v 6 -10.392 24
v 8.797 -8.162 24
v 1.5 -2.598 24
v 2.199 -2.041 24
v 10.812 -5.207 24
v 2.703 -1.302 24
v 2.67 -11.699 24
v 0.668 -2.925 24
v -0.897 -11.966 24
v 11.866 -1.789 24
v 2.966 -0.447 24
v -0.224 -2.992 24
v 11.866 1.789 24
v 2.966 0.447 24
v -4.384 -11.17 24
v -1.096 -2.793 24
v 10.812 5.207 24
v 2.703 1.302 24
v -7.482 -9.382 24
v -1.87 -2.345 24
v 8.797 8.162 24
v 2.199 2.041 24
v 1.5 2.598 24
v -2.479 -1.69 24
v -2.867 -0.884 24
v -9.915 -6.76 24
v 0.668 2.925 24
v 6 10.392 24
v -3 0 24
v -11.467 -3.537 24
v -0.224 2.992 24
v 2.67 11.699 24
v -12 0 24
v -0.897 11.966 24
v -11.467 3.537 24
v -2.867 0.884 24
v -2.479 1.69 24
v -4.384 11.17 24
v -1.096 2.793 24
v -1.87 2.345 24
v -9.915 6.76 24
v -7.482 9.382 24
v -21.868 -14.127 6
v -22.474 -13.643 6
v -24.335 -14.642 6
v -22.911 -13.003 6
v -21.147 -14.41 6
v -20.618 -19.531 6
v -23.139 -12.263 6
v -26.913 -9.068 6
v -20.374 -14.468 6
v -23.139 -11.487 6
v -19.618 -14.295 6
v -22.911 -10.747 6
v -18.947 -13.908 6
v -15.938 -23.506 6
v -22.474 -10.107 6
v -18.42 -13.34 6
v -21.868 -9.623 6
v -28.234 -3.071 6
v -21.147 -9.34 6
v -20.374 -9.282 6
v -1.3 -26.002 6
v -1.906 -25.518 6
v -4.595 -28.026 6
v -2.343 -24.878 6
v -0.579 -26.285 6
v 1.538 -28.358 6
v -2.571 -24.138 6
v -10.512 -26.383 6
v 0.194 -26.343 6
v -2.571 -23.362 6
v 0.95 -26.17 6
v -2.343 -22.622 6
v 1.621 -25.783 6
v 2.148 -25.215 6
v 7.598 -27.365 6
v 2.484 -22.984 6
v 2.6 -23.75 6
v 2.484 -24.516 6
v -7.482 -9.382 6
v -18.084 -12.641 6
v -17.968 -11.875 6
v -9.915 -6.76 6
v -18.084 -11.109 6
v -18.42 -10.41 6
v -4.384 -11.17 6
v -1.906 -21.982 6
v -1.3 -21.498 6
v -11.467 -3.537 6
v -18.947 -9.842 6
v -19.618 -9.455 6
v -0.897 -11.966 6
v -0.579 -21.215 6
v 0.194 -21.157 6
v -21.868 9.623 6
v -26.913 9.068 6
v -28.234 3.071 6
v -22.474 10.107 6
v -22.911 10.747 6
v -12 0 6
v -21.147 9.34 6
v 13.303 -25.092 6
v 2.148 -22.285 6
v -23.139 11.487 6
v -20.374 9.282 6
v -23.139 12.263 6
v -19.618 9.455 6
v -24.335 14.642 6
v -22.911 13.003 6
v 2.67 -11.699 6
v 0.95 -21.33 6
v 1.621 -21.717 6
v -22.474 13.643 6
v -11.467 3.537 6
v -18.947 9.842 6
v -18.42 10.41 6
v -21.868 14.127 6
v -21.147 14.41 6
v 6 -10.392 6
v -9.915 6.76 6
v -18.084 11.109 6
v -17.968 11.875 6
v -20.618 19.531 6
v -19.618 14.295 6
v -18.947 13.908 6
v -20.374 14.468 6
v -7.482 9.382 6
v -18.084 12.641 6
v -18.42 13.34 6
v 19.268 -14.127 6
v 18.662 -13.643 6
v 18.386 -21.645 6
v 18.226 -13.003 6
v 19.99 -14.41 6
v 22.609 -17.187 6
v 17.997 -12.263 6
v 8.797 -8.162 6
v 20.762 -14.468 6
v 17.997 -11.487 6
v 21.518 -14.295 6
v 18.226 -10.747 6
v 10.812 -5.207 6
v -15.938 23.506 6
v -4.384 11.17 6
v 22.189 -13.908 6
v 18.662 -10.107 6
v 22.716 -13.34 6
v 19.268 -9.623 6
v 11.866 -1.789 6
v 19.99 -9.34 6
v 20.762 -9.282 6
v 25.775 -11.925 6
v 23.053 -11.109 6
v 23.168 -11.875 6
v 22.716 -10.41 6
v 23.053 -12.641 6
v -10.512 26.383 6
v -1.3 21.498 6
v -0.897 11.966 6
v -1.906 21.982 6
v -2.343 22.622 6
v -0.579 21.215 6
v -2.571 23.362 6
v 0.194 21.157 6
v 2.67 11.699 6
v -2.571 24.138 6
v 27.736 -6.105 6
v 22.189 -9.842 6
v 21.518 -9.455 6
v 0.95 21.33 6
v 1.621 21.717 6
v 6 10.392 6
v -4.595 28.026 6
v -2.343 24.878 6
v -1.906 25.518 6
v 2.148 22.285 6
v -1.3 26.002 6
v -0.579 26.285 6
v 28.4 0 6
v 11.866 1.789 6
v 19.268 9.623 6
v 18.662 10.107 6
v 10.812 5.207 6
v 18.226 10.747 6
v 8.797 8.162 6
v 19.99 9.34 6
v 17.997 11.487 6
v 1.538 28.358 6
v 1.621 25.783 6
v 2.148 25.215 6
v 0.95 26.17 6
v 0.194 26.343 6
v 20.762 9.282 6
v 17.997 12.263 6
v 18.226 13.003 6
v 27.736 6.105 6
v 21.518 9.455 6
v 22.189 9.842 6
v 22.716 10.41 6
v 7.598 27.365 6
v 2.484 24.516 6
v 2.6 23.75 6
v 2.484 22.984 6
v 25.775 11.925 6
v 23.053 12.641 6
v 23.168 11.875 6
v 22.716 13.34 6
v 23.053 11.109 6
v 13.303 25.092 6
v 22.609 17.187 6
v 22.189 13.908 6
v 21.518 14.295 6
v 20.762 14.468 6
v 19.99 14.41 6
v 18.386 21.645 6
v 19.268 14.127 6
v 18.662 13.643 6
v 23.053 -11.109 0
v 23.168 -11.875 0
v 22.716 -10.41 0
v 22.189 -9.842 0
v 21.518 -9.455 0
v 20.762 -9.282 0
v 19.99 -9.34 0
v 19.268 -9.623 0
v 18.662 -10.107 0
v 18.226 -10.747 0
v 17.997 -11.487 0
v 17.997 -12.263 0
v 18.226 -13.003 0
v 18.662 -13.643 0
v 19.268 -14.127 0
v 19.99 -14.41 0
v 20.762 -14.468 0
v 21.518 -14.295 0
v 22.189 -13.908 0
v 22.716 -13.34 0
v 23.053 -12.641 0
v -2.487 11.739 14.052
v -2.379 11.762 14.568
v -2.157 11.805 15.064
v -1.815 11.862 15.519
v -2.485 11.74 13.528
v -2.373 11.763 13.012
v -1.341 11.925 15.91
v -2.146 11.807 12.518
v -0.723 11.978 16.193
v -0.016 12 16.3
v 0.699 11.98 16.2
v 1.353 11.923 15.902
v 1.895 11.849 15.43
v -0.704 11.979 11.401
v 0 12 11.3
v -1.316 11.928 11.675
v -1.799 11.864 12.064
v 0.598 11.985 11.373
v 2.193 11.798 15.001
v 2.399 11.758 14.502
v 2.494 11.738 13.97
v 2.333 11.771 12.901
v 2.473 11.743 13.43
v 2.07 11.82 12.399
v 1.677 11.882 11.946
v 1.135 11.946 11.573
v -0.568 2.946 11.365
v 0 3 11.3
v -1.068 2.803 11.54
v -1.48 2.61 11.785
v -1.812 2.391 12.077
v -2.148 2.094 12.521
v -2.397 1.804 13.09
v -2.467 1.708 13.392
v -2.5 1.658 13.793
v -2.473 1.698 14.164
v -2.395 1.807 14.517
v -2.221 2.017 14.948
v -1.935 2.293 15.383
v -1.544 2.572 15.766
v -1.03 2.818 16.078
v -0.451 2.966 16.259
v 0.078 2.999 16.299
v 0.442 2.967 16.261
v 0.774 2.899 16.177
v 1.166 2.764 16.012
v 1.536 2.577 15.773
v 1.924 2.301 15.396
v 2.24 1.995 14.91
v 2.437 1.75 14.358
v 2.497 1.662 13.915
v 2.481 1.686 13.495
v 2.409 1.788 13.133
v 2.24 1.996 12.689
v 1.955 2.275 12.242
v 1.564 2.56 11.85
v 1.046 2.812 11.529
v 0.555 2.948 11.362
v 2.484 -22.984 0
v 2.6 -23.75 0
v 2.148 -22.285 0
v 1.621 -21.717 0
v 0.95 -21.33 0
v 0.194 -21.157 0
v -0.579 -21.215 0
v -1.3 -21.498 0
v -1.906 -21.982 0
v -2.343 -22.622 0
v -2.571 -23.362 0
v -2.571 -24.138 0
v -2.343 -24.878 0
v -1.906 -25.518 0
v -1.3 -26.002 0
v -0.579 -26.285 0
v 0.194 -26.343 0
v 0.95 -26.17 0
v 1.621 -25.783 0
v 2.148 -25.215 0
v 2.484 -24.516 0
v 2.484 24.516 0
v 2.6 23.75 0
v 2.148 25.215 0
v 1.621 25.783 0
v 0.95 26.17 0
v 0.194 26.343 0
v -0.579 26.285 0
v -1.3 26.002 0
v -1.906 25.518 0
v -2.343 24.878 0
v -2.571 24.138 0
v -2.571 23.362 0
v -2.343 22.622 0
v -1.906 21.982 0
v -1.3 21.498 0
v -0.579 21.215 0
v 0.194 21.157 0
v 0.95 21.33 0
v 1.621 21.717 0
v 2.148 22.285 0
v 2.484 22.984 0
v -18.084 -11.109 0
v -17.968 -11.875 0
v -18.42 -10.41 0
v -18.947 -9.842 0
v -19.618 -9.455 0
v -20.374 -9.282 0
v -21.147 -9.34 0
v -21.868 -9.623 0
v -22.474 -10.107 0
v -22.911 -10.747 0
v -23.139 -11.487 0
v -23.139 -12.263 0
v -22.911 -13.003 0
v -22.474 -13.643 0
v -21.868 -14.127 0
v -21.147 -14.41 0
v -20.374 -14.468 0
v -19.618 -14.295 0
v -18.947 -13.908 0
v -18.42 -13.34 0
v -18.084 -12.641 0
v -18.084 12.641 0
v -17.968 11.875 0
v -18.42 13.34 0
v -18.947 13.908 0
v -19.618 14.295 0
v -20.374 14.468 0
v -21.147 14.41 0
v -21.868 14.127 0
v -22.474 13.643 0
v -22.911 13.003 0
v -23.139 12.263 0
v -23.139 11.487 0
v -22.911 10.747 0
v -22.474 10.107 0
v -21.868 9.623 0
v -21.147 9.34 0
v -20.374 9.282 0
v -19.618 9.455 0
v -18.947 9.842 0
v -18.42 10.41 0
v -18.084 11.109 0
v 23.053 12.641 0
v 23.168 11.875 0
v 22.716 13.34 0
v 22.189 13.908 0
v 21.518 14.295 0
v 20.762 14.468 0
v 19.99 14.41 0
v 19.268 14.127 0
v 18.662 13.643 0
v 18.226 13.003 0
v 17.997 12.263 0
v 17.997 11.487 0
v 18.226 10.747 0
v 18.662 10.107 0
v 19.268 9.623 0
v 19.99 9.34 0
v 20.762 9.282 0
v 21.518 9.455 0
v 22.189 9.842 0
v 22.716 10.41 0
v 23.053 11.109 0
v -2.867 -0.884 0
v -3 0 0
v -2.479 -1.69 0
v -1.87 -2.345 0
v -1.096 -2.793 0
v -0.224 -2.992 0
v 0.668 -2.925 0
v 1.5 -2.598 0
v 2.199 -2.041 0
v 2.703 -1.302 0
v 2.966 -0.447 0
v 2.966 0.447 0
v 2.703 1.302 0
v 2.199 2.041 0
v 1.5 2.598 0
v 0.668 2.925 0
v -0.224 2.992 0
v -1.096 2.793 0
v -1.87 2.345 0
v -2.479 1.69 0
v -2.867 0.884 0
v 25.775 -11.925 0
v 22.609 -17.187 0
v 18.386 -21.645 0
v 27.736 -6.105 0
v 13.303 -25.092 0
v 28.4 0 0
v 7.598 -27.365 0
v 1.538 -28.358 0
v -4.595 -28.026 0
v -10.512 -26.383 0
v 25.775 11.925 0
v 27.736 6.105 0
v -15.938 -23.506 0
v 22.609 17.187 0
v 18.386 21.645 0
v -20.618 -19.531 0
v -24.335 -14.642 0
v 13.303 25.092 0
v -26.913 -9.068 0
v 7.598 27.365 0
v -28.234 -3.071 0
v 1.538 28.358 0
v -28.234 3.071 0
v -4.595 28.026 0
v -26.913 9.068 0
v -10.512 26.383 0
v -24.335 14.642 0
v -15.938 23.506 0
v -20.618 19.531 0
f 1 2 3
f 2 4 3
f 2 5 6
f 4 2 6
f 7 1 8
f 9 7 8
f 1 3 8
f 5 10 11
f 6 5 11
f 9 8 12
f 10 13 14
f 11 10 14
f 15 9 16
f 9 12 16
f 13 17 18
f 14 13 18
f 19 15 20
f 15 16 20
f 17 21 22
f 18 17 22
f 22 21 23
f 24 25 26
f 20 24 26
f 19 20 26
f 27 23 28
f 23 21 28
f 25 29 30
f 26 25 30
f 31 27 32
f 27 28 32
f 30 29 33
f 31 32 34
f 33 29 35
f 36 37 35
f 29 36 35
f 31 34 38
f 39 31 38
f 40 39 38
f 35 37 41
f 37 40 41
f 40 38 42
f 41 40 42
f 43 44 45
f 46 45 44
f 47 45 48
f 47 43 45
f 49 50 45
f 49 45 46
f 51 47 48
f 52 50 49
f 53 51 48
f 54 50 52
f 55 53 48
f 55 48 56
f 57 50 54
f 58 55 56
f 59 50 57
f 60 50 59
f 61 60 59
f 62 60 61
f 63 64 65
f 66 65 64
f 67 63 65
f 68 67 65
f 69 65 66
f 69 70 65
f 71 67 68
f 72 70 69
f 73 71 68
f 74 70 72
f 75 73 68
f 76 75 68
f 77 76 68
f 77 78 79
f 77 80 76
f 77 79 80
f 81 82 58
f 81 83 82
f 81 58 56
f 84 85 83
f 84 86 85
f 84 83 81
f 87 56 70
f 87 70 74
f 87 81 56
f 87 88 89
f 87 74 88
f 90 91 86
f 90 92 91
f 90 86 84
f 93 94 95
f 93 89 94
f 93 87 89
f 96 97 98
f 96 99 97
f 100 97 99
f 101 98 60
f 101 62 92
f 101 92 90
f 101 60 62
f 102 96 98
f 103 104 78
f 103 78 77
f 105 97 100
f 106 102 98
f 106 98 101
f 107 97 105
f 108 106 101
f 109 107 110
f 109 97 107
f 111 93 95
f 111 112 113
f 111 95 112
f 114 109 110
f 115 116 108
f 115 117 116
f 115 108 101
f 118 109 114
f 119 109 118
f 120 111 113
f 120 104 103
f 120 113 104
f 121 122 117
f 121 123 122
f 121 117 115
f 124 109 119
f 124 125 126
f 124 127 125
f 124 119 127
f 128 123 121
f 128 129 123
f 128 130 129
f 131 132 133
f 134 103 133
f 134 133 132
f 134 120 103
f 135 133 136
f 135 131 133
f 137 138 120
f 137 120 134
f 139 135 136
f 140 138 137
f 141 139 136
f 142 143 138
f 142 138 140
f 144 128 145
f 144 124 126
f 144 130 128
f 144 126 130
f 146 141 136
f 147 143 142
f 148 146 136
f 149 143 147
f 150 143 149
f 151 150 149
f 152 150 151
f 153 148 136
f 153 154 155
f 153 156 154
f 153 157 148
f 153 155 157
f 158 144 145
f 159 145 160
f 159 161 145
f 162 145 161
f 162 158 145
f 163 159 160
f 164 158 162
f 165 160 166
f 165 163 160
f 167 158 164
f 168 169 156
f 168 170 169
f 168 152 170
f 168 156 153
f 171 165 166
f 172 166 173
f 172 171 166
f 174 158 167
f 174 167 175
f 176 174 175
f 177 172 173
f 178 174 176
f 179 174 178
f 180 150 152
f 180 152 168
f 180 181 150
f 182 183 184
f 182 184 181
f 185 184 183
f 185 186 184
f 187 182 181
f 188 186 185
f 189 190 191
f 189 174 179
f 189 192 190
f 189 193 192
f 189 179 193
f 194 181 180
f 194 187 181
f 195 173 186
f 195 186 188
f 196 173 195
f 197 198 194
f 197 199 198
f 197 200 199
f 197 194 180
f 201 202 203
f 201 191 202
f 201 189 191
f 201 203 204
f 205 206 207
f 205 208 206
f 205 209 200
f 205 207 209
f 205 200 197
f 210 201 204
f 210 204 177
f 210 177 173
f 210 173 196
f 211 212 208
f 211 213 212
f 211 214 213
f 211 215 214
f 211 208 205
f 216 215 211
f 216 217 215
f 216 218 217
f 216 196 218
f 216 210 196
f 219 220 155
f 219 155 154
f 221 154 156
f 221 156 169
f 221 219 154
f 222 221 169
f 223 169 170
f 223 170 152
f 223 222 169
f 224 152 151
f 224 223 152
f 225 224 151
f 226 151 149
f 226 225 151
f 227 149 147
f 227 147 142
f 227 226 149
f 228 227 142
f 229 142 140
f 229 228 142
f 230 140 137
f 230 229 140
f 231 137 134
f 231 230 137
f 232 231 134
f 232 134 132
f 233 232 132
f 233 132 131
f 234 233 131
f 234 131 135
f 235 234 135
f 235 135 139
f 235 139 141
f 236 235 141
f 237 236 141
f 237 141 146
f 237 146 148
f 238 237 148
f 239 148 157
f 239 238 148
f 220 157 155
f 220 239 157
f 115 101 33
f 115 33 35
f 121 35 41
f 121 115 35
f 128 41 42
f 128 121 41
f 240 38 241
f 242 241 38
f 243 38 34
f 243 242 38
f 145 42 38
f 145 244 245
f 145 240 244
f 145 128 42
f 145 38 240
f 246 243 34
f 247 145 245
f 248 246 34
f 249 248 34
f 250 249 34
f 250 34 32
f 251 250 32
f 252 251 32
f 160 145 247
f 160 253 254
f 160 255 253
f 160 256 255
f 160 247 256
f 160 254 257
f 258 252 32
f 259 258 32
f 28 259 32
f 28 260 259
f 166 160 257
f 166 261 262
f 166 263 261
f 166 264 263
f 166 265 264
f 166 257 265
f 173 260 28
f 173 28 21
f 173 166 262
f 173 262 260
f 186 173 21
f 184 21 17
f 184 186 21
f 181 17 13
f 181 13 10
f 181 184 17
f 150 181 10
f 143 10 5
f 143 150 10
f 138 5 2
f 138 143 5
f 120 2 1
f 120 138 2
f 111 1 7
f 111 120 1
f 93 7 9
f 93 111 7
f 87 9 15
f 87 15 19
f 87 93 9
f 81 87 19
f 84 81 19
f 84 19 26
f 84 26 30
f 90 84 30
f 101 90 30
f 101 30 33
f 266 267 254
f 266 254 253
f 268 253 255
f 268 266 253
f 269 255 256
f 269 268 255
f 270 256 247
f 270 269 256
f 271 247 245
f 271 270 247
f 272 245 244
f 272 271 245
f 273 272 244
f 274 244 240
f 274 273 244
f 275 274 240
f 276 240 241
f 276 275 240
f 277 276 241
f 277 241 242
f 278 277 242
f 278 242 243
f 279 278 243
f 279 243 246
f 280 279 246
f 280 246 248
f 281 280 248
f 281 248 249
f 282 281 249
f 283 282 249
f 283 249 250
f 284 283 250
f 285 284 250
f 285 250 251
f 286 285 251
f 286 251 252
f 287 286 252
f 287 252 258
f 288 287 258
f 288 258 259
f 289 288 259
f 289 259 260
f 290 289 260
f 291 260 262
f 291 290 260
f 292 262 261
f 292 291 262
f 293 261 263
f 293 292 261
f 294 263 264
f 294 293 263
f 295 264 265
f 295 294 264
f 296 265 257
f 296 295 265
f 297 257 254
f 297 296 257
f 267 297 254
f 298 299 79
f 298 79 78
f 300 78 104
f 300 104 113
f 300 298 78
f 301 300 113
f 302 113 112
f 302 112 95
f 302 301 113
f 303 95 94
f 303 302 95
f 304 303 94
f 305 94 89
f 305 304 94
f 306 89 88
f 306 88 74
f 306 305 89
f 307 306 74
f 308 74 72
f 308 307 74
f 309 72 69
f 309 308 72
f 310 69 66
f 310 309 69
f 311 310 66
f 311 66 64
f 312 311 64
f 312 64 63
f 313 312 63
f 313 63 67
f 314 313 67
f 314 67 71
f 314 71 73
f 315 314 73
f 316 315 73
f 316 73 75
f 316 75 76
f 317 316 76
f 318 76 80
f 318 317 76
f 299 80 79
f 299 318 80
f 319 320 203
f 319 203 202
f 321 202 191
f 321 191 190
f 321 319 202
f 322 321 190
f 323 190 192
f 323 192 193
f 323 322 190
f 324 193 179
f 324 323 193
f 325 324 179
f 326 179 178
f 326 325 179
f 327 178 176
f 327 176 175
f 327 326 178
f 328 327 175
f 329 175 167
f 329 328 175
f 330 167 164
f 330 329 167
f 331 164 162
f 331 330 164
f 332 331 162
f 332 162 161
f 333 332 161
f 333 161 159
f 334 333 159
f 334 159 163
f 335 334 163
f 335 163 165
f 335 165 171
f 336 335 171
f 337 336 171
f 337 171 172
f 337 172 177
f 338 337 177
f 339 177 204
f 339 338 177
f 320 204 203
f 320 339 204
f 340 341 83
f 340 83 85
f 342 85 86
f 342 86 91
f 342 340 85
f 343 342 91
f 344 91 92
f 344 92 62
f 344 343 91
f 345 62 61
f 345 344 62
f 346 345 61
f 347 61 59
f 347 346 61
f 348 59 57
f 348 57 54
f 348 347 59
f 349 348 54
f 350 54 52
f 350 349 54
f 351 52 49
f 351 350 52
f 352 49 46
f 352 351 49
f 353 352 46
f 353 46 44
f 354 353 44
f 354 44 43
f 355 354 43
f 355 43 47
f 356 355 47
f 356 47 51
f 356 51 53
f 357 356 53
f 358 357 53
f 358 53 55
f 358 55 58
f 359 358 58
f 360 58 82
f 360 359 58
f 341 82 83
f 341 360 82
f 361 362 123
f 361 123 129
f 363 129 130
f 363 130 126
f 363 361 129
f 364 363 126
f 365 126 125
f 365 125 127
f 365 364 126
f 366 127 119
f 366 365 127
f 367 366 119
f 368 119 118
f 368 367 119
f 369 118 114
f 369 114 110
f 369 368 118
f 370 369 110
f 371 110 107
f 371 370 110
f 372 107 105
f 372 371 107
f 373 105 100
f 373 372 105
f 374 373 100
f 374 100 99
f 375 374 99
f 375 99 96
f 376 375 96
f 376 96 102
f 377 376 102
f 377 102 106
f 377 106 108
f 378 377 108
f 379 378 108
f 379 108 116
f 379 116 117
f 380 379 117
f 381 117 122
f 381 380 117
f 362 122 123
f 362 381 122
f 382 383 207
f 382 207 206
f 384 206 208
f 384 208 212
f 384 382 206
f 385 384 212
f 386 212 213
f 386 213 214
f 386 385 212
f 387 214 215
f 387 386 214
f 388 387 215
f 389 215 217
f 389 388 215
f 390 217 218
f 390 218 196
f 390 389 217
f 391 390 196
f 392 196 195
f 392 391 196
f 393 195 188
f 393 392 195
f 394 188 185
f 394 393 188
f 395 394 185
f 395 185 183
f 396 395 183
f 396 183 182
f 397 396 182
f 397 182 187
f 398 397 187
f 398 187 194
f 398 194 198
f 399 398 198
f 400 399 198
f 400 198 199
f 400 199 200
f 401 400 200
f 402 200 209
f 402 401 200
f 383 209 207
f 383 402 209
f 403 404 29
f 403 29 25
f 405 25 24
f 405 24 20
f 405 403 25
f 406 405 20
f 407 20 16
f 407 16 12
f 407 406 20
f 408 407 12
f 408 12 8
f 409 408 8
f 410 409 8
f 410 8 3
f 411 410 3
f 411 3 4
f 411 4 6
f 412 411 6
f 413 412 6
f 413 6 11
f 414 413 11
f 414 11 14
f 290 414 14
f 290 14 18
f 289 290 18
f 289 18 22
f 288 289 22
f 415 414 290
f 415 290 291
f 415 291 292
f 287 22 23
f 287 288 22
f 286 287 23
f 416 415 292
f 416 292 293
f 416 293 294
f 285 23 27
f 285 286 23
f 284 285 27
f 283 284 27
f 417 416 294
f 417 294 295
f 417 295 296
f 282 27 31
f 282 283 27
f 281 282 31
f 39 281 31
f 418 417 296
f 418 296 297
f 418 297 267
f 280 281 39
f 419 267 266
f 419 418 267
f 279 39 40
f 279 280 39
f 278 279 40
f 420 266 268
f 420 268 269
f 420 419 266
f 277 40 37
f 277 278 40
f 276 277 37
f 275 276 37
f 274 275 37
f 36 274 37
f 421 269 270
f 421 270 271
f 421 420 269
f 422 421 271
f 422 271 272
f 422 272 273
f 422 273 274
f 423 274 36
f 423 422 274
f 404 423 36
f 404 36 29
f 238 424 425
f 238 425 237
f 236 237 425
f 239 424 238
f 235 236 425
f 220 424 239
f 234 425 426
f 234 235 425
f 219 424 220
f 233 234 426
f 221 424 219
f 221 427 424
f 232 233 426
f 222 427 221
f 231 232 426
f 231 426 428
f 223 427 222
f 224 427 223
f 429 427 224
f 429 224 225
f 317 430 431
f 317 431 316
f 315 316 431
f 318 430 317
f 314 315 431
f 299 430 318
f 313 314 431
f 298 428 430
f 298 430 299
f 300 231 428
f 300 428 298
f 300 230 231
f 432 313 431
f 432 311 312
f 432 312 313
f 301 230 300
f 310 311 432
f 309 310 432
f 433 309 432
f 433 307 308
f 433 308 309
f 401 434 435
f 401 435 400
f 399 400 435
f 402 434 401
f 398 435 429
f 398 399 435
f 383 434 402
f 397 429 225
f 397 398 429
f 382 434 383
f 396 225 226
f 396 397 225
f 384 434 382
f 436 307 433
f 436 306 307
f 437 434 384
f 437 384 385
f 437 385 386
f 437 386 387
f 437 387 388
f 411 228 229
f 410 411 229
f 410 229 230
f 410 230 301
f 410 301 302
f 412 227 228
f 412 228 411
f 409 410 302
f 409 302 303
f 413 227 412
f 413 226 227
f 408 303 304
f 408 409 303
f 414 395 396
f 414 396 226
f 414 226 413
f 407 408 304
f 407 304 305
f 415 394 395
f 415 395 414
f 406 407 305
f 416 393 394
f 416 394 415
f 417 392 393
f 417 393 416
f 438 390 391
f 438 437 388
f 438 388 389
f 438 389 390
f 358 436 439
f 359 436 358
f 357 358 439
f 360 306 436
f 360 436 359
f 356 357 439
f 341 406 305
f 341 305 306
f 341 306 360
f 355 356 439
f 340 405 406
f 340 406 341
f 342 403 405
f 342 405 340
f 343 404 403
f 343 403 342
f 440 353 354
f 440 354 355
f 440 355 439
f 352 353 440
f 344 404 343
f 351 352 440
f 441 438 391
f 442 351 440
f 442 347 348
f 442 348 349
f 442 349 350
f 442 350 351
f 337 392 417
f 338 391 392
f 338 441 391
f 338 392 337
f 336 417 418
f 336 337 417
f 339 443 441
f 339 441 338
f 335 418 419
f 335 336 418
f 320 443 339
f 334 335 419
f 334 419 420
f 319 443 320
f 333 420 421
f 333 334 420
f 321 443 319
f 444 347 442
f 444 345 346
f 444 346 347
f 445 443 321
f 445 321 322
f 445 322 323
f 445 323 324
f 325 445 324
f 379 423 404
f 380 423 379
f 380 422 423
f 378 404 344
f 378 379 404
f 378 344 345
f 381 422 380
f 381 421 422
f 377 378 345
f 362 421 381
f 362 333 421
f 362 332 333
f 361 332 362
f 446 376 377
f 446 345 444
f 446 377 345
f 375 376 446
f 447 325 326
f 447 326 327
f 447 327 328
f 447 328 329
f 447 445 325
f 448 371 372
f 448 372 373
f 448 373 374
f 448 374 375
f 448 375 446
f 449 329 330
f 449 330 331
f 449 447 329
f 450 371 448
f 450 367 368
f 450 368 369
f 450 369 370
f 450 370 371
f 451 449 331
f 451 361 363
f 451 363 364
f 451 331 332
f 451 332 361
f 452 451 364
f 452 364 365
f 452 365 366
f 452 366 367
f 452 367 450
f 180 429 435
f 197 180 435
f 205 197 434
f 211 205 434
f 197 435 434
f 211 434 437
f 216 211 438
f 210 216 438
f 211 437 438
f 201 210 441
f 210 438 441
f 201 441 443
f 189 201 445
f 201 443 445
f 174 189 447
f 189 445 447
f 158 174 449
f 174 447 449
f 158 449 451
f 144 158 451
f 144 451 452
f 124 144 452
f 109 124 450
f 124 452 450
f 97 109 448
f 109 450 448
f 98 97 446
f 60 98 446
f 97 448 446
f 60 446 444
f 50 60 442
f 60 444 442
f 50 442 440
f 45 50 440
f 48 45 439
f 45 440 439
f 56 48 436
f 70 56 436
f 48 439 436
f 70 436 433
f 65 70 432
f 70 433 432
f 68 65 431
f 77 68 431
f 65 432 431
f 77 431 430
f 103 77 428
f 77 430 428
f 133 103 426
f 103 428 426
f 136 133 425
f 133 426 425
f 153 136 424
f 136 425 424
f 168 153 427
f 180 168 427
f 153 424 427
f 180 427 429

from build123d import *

# Parameters (mm, degrees)
SKETCH1_R               = 28.4
SKETCH1_R_2             = 3
SKETCH1_R_3             = 2.6
BOSS_EXTRUDE1_DEPTH     = 6
SKETCH3_R               = 12
BOSS_EXTRUDE2_DEPTH     = 24
SKETCH1_3_R             = 3
CUT_EXTRUDE1_DEPTH      = 24
CUT_EXTRUDE2_REACH      = 48.788
CUT_EXTRUDE2_END_RADIUS = 12
SKETCH4_R               = 2.5


with BuildPart() as part:
    # Sketch1 → Boss-Extrude1 (new body)
    # profile 1 of 2: a face of its own
    with BuildSketch(Plane.XY):
        Circle(SKETCH1_R)
        Circle(SKETCH1_R_2, mode=Mode.SUBTRACT)
        with Locations((-20.56810334, 11.875)):
            Circle(SKETCH1_R_3, mode=Mode.SUBTRACT)
        with Locations((-20.56810334, -11.875)):
            Circle(SKETCH1_R_3, mode=Mode.SUBTRACT)
        with Locations((0, -23.75)):
            Circle(SKETCH1_R_3, mode=Mode.SUBTRACT)
        with Locations((20.56810334, -11.875)):
            Circle(SKETCH1_R_3, mode=Mode.SUBTRACT)
        with Locations((20.56810334, 11.875)):
            Circle(SKETCH1_R_3, mode=Mode.SUBTRACT)
        with Locations((0, 23.75)):
            Circle(SKETCH1_R_3, mode=Mode.SUBTRACT)
    # profile 2 of 2: a face of its own
    with BuildSketch(Plane.XY):
        Circle(SKETCH1_R_2)
    extrude(amount=BOSS_EXTRUDE1_DEPTH)

    # Sketch3 → Boss-Extrude2 (add)
    with BuildSketch(Plane(origin=(0, 0, 0), x_dir=(-1, 0, 0), z_dir=(0, 0, -1))):
        Circle(SKETCH3_R)
    extrude(amount=-BOSS_EXTRUDE2_DEPTH)

    # Sketch1<3> → Cut-Extrude1 (cut)
    with BuildSketch(Plane.XY):
        with Locations(Location((0, 0, 0), (0, 0, 180))):
            Circle(SKETCH1_3_R)
    extrude(amount=CUT_EXTRUDE1_DEPTH, mode=Mode.SUBTRACT)

    # Cut-Extrude2: up to this cylinder (the profile starts inside it)
    cut_extrude2_end = Plane(origin=(0, 0, 13.8), z_dir=(0, 0, -1)) * Cylinder(CUT_EXTRUDE2_END_RADIUS, 122.576, mode=Mode.PRIVATE)
    # Sketch4 → Cut-Extrude2 (cut, up to the surface)
    with BuildSketch(Plane(origin=(0, 0, 0), x_dir=(1, 0, 0), z_dir=(0, 1, 0)), mode=Mode.PRIVATE) as cut_extrude2_sk1:
        with Locations(Location((0, -13.8, 0), (0, 0, 90))):
            Circle(SKETCH4_R)
    cut_extrude2_tool1 = extrude(cut_extrude2_sk1.sketch, amount=CUT_EXTRUDE2_REACH, mode=Mode.PRIVATE) & cut_extrude2_end
    add(cut_extrude2_tool1.solids().sort_by_distance((0, 0, 13.8))[0], mode=Mode.SUBTRACT)


solid = part.part
